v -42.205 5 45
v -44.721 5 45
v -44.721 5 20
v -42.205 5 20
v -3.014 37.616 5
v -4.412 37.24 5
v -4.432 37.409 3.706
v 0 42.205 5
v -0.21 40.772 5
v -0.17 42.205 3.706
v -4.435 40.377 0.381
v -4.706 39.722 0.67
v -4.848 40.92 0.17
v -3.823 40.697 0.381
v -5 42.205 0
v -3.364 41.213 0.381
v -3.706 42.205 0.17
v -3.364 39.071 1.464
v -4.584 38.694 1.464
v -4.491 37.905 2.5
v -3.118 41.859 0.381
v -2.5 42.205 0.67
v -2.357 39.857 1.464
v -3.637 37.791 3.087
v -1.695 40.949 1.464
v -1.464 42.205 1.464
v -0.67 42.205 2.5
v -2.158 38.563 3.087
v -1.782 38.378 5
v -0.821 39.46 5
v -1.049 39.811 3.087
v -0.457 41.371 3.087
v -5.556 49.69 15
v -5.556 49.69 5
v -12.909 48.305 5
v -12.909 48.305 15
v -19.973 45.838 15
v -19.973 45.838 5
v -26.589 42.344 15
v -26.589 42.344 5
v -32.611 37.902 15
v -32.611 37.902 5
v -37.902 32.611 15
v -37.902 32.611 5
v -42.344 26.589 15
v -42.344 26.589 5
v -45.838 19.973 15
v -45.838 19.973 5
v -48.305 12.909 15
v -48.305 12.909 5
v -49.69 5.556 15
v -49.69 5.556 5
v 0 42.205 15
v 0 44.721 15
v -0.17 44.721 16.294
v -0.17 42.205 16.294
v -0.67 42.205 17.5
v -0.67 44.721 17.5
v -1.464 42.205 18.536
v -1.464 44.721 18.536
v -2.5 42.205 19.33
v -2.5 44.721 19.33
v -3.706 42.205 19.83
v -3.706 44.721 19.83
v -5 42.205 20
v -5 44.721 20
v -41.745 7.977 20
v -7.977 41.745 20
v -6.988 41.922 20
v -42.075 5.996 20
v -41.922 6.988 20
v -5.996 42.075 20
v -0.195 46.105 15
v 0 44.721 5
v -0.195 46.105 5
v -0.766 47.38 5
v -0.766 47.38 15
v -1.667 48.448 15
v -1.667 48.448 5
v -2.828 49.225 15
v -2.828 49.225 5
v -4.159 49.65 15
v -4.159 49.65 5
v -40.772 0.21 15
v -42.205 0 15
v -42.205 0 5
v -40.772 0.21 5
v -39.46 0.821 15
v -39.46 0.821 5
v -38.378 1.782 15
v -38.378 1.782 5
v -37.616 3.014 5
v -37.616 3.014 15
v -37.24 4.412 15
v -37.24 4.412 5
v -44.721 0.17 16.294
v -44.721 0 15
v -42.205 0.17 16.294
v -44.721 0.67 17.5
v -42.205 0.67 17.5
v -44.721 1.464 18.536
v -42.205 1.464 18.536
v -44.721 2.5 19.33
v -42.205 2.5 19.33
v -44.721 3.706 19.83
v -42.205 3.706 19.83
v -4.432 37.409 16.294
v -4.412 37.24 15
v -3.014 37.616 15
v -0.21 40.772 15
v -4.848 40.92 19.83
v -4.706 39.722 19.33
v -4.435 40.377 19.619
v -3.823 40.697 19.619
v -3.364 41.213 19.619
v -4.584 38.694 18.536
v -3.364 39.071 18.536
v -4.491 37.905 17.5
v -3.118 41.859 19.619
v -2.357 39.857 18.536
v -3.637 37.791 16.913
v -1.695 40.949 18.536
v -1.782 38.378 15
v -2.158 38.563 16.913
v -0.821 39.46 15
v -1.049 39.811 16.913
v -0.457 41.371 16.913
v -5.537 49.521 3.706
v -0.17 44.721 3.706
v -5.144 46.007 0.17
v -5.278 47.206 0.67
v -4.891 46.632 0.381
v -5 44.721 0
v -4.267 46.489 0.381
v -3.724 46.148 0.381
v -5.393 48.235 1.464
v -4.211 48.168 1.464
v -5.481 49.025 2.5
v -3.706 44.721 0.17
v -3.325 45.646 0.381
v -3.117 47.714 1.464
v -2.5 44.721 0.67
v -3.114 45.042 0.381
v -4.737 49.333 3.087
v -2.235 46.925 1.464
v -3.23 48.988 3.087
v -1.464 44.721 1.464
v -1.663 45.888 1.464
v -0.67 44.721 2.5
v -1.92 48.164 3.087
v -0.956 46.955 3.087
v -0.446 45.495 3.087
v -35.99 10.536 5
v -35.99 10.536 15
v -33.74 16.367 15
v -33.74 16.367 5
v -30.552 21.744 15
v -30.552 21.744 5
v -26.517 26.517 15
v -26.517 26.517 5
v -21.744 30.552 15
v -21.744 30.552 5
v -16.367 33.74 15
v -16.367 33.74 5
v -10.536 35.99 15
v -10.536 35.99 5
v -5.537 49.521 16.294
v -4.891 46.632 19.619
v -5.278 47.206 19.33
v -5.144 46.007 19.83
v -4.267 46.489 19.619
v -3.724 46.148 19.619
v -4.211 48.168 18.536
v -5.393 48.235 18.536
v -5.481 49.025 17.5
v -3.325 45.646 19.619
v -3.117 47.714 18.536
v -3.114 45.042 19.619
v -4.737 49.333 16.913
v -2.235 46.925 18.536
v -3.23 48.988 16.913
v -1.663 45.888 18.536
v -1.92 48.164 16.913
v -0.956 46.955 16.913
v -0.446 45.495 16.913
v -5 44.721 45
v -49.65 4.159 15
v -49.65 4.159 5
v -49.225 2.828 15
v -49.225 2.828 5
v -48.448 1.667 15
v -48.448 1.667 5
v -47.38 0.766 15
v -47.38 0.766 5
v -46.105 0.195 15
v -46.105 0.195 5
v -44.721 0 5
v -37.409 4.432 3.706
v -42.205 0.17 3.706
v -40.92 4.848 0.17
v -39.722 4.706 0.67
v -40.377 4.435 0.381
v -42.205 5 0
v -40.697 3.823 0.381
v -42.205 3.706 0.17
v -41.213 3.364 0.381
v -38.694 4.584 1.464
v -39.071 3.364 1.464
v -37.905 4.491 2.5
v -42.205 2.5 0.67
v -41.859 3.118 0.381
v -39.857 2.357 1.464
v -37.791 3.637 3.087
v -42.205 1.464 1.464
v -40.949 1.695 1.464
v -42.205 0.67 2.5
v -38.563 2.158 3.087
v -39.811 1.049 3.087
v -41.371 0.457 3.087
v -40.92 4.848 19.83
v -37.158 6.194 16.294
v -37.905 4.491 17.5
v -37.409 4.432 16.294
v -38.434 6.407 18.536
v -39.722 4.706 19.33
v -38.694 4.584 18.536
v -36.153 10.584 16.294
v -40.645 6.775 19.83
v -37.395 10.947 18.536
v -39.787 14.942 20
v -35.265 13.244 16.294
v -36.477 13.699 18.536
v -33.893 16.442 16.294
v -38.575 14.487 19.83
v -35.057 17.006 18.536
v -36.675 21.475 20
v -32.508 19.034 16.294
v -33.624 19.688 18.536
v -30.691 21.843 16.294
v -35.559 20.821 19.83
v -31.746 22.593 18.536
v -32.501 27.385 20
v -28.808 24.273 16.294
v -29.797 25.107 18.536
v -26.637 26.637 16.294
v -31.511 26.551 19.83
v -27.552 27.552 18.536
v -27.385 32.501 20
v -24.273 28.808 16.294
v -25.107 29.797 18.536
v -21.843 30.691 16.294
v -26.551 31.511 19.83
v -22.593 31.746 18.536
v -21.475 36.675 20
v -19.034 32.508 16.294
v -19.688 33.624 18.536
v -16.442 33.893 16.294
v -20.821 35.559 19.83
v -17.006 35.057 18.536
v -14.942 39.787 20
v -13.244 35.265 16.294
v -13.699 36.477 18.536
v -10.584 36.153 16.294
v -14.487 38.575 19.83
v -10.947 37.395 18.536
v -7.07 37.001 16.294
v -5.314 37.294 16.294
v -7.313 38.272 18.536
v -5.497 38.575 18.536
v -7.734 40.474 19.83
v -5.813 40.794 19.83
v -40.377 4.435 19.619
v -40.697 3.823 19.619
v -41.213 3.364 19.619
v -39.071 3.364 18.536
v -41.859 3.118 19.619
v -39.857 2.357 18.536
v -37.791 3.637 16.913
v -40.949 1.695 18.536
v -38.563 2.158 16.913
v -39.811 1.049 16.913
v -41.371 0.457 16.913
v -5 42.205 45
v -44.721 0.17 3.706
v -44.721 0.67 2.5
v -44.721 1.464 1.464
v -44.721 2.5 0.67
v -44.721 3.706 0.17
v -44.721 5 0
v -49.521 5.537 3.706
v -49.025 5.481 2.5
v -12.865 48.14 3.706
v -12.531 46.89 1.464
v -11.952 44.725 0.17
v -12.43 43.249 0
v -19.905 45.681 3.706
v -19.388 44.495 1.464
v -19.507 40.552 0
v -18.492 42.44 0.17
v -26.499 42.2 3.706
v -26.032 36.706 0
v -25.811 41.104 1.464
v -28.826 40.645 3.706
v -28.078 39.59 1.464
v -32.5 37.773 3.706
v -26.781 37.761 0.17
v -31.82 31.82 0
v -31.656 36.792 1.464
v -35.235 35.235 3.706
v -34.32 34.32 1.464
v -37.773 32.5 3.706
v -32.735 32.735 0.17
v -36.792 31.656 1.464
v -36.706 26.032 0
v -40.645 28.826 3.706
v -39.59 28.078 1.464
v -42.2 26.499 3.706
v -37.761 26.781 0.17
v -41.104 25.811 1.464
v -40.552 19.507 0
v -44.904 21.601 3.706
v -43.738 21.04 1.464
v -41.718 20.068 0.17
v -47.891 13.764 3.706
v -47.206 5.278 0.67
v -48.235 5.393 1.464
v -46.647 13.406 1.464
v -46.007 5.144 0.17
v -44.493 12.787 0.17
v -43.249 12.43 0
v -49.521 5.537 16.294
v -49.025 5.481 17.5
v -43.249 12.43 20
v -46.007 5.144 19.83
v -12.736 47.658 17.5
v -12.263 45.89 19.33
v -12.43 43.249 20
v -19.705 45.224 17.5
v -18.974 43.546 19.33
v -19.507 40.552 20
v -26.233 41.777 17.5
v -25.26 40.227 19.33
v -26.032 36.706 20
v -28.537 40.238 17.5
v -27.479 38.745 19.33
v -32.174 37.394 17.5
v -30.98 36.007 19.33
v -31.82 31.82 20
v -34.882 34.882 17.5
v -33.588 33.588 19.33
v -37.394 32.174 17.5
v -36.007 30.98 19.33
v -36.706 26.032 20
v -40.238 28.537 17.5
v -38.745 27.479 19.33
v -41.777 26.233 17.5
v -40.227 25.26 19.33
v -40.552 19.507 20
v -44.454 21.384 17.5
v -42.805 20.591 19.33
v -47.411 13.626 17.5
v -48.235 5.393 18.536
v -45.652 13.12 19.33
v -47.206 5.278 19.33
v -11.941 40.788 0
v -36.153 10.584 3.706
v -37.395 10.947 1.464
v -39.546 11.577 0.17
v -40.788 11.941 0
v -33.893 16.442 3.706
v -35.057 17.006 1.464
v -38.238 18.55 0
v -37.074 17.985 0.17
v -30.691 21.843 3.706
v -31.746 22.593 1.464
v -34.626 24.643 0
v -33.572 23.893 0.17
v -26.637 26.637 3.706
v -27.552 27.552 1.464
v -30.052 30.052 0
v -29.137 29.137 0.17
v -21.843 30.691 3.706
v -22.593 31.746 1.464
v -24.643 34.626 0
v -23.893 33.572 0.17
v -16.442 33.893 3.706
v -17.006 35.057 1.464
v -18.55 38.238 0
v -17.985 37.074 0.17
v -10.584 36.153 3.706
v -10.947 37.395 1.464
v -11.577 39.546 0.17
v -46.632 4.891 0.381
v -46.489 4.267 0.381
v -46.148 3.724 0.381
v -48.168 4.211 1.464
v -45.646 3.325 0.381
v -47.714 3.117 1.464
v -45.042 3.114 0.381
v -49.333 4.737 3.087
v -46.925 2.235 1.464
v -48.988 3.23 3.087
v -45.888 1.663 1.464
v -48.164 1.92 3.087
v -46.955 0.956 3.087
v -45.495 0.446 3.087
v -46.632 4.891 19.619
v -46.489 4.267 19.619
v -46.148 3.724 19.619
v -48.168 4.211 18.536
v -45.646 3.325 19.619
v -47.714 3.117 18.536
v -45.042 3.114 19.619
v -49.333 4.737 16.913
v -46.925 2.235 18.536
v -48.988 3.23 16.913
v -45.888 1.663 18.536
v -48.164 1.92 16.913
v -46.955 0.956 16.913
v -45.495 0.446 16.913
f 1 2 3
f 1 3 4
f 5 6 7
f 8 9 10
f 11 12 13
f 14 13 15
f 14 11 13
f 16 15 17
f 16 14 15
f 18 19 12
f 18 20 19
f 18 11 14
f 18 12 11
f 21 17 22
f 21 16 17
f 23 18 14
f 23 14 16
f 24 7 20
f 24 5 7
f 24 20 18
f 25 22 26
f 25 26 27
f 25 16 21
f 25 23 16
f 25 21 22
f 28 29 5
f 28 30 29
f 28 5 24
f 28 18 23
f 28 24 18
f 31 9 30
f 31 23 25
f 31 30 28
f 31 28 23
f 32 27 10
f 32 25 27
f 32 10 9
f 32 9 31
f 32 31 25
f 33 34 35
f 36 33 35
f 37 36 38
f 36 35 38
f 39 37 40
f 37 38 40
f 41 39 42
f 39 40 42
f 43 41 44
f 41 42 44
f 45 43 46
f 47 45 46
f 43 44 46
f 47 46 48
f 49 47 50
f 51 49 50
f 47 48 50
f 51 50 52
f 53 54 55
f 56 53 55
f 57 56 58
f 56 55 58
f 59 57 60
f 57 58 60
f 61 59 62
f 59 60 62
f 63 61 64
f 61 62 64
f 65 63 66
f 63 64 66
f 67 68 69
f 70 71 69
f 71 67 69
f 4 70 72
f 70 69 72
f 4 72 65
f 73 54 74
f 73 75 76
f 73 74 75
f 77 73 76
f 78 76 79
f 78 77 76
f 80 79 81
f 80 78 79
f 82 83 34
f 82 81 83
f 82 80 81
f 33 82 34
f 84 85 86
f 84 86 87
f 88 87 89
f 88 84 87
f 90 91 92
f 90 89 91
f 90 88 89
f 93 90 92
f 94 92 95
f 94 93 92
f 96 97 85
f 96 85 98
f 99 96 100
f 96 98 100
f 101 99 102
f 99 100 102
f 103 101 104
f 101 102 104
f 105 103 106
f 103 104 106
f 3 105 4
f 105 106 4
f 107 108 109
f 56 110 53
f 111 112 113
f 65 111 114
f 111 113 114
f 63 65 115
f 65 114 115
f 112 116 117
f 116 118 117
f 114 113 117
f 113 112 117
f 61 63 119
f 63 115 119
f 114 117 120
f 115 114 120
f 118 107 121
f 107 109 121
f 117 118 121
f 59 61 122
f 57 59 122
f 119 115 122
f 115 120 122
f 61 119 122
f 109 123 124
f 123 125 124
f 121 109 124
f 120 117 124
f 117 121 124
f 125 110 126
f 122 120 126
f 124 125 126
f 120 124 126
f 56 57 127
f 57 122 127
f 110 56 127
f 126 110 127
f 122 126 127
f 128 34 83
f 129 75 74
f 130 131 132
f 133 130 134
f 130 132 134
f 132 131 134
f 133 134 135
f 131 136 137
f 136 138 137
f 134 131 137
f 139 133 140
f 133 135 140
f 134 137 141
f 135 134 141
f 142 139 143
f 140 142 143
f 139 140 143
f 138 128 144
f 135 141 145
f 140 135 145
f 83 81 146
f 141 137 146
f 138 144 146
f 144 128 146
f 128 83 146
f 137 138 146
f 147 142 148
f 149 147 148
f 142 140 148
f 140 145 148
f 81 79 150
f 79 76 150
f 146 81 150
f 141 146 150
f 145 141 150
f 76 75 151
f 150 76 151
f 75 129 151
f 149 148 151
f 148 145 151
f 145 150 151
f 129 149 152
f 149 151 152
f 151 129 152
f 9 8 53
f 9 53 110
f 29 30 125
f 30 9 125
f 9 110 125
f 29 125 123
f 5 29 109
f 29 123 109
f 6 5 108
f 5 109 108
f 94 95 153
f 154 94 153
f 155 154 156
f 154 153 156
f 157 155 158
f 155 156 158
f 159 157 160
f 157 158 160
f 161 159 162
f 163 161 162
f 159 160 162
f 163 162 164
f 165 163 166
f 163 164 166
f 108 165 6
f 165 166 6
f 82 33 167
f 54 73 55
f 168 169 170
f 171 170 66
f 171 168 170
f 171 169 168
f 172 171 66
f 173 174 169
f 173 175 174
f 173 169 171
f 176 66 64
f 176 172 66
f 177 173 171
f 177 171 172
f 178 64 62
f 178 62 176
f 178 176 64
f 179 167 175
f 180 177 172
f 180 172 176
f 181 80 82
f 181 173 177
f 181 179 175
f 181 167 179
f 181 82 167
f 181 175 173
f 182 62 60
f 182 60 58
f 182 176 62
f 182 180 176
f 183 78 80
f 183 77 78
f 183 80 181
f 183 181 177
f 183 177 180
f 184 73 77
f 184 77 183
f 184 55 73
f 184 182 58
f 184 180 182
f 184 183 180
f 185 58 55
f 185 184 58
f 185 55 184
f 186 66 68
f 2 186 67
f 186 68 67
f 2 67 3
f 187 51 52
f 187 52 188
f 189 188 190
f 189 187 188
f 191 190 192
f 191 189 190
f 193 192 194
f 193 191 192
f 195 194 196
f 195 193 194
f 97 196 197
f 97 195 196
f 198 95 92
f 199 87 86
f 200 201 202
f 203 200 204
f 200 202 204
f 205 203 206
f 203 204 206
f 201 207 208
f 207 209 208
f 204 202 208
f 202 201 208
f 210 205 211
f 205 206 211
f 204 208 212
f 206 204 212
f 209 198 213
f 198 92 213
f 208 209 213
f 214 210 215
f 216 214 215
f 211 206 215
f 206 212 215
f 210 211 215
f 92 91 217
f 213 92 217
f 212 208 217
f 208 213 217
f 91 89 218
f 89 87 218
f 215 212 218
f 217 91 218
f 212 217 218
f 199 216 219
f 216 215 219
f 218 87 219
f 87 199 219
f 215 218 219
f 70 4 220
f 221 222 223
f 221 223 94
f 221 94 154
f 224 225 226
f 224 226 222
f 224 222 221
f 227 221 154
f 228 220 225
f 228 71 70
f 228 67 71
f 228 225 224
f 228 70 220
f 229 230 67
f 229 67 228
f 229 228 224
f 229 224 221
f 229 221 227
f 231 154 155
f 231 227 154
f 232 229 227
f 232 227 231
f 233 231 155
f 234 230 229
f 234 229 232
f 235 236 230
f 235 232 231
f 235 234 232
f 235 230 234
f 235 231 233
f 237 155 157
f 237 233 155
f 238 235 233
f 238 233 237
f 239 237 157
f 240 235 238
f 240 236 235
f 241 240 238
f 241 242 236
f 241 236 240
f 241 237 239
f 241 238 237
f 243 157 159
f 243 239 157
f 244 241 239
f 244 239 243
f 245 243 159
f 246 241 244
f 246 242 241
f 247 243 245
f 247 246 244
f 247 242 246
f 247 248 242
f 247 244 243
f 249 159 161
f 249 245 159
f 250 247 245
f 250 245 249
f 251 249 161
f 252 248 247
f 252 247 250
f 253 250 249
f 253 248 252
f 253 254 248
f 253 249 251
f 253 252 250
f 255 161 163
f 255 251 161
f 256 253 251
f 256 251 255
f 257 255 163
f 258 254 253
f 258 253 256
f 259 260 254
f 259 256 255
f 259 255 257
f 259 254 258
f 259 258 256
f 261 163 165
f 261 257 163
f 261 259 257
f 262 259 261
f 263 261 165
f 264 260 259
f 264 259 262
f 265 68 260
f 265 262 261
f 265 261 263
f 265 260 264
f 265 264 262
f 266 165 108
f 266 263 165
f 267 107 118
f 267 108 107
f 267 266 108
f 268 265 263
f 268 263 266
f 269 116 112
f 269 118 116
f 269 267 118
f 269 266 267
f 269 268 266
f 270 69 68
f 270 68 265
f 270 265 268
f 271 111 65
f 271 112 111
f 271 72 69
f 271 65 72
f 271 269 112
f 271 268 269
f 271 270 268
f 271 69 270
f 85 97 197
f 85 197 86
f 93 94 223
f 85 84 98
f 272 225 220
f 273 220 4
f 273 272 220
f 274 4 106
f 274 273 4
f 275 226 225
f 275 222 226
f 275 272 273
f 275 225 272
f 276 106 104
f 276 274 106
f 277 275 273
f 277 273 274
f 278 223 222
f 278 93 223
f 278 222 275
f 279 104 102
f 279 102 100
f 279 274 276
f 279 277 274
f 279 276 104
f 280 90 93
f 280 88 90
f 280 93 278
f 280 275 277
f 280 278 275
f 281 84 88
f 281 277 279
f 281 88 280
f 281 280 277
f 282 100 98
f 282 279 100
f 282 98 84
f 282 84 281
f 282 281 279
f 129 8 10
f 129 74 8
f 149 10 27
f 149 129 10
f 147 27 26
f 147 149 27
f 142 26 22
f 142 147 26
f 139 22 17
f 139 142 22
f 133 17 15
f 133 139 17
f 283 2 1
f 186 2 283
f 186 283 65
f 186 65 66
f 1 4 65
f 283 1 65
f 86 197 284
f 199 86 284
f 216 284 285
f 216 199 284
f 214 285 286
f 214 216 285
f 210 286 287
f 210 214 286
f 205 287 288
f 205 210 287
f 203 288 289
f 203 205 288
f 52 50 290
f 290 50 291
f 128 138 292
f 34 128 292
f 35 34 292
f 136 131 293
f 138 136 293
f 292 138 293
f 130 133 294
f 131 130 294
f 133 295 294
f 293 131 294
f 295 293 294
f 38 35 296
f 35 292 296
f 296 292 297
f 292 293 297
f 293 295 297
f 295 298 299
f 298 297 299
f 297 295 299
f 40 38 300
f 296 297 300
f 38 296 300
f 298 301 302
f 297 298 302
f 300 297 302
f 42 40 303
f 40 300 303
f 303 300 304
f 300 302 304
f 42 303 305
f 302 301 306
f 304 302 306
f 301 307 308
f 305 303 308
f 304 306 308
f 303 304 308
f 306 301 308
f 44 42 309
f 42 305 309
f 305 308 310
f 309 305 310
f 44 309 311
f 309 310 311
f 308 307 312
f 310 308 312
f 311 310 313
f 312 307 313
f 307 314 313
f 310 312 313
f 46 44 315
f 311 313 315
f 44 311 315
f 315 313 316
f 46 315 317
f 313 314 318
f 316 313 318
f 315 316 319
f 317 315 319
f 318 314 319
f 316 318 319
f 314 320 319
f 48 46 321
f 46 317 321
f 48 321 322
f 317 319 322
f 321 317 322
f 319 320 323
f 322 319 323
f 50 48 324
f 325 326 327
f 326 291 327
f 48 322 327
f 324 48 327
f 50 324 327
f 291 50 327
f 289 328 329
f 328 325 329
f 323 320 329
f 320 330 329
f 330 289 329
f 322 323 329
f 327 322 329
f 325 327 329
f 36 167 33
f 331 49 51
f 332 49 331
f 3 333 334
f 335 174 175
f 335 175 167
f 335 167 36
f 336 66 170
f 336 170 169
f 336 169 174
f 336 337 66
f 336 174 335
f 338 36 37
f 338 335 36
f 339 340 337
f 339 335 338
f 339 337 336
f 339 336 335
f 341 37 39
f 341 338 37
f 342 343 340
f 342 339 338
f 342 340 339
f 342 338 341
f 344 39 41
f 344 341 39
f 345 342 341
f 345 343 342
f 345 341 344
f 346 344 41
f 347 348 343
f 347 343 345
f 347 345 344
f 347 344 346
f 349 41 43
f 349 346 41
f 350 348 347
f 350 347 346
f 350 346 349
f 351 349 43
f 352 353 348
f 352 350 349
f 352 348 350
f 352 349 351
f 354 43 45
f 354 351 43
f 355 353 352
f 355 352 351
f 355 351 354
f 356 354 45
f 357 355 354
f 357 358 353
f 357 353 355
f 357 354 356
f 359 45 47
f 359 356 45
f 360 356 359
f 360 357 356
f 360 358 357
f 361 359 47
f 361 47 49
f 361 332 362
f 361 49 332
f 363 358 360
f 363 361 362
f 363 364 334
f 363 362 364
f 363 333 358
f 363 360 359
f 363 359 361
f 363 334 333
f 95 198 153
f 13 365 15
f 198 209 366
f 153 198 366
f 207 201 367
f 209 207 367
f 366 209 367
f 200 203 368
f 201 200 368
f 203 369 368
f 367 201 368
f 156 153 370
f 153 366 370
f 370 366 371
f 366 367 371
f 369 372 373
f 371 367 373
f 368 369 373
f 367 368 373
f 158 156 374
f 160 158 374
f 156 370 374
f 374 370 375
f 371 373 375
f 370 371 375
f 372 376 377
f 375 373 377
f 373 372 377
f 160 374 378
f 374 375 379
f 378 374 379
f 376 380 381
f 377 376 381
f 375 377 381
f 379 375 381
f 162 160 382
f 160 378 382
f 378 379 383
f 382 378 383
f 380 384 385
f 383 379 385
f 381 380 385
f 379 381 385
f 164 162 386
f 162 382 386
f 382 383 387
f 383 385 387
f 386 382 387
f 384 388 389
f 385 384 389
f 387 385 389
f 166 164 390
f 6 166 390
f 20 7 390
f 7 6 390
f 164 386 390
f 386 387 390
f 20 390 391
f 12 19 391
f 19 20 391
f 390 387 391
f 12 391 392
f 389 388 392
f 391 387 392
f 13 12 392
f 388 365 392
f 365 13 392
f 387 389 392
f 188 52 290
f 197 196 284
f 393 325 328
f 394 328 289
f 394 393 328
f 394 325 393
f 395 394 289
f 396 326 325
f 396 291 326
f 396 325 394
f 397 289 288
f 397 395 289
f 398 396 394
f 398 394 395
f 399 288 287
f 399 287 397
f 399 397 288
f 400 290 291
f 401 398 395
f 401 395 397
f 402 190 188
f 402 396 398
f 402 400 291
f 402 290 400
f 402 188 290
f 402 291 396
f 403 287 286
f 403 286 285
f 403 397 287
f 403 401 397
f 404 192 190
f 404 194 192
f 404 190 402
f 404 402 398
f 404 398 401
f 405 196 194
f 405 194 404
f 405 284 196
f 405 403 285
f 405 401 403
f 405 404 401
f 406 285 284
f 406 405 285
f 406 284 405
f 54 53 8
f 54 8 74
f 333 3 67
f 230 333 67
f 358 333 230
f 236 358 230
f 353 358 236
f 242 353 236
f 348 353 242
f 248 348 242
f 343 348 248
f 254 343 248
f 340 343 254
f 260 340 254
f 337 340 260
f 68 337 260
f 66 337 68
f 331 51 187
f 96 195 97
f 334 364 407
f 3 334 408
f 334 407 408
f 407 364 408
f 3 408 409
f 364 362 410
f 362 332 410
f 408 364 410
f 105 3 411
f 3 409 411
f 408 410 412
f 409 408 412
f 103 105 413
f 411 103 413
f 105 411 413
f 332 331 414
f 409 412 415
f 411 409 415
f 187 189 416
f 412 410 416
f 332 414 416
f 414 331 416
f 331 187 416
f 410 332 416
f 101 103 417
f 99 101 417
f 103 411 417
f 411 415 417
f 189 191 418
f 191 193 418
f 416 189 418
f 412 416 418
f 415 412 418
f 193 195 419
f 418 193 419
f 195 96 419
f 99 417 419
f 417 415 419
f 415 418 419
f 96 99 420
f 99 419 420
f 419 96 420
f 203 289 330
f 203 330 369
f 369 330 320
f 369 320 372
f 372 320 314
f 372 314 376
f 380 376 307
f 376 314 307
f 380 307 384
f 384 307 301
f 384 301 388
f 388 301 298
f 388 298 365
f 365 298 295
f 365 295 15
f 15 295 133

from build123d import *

# Parameters (mm, degrees)
F1_DEPTH = 20
F2_R     = 5
F4_DEPTH = 25


with BuildPart() as f1:
    # F0 (on Top) → F1 (new body)
    with BuildSketch(Plane.XY):
        with BuildLine():
            Line((0, 37.5), (0, 50))
            ThreePointArc((0, 50), (-35.355339, 35.355339), (-50, 0))
            Line((-50, 0), (-37.5, 0))
            ThreePointArc((-37.5, 0), (-26.516504, 26.516504), (0, 37.5))
        make_face()
    extrude(amount=F1_DEPTH)

    # F2
    f2_edges = [f1.edges().sort_by_distance(p)[0] for p in [
        (-26.516504, 26.516504, 0),
        (-26.516504, 26.516504, 20),
        (-43.75, 0, 0),
        (-43.75, 0, 20),
        (0, 43.75, 0),
        (0, 43.75, 20),
        (-50, 0, 10),
        (0, 50, 10),
        (0, 37.5, 10),
        (-37.5, 0, 10),
        (-35.355339, 35.355339, 0),
        (-35.355339, 35.355339, 20),
    ]]
    fillet(f2_edges, radius=F2_R)

    # F3 (on face) → F4 (join)
    with BuildSketch(Plane.XY.offset(20)):
        Polygon((-5, 44.72136), (-44.72136, 5), (-42.204858, 5), (-5, 42.204858), align=None)
    extrude(amount=F4_DEPTH)


solid = f1.part
